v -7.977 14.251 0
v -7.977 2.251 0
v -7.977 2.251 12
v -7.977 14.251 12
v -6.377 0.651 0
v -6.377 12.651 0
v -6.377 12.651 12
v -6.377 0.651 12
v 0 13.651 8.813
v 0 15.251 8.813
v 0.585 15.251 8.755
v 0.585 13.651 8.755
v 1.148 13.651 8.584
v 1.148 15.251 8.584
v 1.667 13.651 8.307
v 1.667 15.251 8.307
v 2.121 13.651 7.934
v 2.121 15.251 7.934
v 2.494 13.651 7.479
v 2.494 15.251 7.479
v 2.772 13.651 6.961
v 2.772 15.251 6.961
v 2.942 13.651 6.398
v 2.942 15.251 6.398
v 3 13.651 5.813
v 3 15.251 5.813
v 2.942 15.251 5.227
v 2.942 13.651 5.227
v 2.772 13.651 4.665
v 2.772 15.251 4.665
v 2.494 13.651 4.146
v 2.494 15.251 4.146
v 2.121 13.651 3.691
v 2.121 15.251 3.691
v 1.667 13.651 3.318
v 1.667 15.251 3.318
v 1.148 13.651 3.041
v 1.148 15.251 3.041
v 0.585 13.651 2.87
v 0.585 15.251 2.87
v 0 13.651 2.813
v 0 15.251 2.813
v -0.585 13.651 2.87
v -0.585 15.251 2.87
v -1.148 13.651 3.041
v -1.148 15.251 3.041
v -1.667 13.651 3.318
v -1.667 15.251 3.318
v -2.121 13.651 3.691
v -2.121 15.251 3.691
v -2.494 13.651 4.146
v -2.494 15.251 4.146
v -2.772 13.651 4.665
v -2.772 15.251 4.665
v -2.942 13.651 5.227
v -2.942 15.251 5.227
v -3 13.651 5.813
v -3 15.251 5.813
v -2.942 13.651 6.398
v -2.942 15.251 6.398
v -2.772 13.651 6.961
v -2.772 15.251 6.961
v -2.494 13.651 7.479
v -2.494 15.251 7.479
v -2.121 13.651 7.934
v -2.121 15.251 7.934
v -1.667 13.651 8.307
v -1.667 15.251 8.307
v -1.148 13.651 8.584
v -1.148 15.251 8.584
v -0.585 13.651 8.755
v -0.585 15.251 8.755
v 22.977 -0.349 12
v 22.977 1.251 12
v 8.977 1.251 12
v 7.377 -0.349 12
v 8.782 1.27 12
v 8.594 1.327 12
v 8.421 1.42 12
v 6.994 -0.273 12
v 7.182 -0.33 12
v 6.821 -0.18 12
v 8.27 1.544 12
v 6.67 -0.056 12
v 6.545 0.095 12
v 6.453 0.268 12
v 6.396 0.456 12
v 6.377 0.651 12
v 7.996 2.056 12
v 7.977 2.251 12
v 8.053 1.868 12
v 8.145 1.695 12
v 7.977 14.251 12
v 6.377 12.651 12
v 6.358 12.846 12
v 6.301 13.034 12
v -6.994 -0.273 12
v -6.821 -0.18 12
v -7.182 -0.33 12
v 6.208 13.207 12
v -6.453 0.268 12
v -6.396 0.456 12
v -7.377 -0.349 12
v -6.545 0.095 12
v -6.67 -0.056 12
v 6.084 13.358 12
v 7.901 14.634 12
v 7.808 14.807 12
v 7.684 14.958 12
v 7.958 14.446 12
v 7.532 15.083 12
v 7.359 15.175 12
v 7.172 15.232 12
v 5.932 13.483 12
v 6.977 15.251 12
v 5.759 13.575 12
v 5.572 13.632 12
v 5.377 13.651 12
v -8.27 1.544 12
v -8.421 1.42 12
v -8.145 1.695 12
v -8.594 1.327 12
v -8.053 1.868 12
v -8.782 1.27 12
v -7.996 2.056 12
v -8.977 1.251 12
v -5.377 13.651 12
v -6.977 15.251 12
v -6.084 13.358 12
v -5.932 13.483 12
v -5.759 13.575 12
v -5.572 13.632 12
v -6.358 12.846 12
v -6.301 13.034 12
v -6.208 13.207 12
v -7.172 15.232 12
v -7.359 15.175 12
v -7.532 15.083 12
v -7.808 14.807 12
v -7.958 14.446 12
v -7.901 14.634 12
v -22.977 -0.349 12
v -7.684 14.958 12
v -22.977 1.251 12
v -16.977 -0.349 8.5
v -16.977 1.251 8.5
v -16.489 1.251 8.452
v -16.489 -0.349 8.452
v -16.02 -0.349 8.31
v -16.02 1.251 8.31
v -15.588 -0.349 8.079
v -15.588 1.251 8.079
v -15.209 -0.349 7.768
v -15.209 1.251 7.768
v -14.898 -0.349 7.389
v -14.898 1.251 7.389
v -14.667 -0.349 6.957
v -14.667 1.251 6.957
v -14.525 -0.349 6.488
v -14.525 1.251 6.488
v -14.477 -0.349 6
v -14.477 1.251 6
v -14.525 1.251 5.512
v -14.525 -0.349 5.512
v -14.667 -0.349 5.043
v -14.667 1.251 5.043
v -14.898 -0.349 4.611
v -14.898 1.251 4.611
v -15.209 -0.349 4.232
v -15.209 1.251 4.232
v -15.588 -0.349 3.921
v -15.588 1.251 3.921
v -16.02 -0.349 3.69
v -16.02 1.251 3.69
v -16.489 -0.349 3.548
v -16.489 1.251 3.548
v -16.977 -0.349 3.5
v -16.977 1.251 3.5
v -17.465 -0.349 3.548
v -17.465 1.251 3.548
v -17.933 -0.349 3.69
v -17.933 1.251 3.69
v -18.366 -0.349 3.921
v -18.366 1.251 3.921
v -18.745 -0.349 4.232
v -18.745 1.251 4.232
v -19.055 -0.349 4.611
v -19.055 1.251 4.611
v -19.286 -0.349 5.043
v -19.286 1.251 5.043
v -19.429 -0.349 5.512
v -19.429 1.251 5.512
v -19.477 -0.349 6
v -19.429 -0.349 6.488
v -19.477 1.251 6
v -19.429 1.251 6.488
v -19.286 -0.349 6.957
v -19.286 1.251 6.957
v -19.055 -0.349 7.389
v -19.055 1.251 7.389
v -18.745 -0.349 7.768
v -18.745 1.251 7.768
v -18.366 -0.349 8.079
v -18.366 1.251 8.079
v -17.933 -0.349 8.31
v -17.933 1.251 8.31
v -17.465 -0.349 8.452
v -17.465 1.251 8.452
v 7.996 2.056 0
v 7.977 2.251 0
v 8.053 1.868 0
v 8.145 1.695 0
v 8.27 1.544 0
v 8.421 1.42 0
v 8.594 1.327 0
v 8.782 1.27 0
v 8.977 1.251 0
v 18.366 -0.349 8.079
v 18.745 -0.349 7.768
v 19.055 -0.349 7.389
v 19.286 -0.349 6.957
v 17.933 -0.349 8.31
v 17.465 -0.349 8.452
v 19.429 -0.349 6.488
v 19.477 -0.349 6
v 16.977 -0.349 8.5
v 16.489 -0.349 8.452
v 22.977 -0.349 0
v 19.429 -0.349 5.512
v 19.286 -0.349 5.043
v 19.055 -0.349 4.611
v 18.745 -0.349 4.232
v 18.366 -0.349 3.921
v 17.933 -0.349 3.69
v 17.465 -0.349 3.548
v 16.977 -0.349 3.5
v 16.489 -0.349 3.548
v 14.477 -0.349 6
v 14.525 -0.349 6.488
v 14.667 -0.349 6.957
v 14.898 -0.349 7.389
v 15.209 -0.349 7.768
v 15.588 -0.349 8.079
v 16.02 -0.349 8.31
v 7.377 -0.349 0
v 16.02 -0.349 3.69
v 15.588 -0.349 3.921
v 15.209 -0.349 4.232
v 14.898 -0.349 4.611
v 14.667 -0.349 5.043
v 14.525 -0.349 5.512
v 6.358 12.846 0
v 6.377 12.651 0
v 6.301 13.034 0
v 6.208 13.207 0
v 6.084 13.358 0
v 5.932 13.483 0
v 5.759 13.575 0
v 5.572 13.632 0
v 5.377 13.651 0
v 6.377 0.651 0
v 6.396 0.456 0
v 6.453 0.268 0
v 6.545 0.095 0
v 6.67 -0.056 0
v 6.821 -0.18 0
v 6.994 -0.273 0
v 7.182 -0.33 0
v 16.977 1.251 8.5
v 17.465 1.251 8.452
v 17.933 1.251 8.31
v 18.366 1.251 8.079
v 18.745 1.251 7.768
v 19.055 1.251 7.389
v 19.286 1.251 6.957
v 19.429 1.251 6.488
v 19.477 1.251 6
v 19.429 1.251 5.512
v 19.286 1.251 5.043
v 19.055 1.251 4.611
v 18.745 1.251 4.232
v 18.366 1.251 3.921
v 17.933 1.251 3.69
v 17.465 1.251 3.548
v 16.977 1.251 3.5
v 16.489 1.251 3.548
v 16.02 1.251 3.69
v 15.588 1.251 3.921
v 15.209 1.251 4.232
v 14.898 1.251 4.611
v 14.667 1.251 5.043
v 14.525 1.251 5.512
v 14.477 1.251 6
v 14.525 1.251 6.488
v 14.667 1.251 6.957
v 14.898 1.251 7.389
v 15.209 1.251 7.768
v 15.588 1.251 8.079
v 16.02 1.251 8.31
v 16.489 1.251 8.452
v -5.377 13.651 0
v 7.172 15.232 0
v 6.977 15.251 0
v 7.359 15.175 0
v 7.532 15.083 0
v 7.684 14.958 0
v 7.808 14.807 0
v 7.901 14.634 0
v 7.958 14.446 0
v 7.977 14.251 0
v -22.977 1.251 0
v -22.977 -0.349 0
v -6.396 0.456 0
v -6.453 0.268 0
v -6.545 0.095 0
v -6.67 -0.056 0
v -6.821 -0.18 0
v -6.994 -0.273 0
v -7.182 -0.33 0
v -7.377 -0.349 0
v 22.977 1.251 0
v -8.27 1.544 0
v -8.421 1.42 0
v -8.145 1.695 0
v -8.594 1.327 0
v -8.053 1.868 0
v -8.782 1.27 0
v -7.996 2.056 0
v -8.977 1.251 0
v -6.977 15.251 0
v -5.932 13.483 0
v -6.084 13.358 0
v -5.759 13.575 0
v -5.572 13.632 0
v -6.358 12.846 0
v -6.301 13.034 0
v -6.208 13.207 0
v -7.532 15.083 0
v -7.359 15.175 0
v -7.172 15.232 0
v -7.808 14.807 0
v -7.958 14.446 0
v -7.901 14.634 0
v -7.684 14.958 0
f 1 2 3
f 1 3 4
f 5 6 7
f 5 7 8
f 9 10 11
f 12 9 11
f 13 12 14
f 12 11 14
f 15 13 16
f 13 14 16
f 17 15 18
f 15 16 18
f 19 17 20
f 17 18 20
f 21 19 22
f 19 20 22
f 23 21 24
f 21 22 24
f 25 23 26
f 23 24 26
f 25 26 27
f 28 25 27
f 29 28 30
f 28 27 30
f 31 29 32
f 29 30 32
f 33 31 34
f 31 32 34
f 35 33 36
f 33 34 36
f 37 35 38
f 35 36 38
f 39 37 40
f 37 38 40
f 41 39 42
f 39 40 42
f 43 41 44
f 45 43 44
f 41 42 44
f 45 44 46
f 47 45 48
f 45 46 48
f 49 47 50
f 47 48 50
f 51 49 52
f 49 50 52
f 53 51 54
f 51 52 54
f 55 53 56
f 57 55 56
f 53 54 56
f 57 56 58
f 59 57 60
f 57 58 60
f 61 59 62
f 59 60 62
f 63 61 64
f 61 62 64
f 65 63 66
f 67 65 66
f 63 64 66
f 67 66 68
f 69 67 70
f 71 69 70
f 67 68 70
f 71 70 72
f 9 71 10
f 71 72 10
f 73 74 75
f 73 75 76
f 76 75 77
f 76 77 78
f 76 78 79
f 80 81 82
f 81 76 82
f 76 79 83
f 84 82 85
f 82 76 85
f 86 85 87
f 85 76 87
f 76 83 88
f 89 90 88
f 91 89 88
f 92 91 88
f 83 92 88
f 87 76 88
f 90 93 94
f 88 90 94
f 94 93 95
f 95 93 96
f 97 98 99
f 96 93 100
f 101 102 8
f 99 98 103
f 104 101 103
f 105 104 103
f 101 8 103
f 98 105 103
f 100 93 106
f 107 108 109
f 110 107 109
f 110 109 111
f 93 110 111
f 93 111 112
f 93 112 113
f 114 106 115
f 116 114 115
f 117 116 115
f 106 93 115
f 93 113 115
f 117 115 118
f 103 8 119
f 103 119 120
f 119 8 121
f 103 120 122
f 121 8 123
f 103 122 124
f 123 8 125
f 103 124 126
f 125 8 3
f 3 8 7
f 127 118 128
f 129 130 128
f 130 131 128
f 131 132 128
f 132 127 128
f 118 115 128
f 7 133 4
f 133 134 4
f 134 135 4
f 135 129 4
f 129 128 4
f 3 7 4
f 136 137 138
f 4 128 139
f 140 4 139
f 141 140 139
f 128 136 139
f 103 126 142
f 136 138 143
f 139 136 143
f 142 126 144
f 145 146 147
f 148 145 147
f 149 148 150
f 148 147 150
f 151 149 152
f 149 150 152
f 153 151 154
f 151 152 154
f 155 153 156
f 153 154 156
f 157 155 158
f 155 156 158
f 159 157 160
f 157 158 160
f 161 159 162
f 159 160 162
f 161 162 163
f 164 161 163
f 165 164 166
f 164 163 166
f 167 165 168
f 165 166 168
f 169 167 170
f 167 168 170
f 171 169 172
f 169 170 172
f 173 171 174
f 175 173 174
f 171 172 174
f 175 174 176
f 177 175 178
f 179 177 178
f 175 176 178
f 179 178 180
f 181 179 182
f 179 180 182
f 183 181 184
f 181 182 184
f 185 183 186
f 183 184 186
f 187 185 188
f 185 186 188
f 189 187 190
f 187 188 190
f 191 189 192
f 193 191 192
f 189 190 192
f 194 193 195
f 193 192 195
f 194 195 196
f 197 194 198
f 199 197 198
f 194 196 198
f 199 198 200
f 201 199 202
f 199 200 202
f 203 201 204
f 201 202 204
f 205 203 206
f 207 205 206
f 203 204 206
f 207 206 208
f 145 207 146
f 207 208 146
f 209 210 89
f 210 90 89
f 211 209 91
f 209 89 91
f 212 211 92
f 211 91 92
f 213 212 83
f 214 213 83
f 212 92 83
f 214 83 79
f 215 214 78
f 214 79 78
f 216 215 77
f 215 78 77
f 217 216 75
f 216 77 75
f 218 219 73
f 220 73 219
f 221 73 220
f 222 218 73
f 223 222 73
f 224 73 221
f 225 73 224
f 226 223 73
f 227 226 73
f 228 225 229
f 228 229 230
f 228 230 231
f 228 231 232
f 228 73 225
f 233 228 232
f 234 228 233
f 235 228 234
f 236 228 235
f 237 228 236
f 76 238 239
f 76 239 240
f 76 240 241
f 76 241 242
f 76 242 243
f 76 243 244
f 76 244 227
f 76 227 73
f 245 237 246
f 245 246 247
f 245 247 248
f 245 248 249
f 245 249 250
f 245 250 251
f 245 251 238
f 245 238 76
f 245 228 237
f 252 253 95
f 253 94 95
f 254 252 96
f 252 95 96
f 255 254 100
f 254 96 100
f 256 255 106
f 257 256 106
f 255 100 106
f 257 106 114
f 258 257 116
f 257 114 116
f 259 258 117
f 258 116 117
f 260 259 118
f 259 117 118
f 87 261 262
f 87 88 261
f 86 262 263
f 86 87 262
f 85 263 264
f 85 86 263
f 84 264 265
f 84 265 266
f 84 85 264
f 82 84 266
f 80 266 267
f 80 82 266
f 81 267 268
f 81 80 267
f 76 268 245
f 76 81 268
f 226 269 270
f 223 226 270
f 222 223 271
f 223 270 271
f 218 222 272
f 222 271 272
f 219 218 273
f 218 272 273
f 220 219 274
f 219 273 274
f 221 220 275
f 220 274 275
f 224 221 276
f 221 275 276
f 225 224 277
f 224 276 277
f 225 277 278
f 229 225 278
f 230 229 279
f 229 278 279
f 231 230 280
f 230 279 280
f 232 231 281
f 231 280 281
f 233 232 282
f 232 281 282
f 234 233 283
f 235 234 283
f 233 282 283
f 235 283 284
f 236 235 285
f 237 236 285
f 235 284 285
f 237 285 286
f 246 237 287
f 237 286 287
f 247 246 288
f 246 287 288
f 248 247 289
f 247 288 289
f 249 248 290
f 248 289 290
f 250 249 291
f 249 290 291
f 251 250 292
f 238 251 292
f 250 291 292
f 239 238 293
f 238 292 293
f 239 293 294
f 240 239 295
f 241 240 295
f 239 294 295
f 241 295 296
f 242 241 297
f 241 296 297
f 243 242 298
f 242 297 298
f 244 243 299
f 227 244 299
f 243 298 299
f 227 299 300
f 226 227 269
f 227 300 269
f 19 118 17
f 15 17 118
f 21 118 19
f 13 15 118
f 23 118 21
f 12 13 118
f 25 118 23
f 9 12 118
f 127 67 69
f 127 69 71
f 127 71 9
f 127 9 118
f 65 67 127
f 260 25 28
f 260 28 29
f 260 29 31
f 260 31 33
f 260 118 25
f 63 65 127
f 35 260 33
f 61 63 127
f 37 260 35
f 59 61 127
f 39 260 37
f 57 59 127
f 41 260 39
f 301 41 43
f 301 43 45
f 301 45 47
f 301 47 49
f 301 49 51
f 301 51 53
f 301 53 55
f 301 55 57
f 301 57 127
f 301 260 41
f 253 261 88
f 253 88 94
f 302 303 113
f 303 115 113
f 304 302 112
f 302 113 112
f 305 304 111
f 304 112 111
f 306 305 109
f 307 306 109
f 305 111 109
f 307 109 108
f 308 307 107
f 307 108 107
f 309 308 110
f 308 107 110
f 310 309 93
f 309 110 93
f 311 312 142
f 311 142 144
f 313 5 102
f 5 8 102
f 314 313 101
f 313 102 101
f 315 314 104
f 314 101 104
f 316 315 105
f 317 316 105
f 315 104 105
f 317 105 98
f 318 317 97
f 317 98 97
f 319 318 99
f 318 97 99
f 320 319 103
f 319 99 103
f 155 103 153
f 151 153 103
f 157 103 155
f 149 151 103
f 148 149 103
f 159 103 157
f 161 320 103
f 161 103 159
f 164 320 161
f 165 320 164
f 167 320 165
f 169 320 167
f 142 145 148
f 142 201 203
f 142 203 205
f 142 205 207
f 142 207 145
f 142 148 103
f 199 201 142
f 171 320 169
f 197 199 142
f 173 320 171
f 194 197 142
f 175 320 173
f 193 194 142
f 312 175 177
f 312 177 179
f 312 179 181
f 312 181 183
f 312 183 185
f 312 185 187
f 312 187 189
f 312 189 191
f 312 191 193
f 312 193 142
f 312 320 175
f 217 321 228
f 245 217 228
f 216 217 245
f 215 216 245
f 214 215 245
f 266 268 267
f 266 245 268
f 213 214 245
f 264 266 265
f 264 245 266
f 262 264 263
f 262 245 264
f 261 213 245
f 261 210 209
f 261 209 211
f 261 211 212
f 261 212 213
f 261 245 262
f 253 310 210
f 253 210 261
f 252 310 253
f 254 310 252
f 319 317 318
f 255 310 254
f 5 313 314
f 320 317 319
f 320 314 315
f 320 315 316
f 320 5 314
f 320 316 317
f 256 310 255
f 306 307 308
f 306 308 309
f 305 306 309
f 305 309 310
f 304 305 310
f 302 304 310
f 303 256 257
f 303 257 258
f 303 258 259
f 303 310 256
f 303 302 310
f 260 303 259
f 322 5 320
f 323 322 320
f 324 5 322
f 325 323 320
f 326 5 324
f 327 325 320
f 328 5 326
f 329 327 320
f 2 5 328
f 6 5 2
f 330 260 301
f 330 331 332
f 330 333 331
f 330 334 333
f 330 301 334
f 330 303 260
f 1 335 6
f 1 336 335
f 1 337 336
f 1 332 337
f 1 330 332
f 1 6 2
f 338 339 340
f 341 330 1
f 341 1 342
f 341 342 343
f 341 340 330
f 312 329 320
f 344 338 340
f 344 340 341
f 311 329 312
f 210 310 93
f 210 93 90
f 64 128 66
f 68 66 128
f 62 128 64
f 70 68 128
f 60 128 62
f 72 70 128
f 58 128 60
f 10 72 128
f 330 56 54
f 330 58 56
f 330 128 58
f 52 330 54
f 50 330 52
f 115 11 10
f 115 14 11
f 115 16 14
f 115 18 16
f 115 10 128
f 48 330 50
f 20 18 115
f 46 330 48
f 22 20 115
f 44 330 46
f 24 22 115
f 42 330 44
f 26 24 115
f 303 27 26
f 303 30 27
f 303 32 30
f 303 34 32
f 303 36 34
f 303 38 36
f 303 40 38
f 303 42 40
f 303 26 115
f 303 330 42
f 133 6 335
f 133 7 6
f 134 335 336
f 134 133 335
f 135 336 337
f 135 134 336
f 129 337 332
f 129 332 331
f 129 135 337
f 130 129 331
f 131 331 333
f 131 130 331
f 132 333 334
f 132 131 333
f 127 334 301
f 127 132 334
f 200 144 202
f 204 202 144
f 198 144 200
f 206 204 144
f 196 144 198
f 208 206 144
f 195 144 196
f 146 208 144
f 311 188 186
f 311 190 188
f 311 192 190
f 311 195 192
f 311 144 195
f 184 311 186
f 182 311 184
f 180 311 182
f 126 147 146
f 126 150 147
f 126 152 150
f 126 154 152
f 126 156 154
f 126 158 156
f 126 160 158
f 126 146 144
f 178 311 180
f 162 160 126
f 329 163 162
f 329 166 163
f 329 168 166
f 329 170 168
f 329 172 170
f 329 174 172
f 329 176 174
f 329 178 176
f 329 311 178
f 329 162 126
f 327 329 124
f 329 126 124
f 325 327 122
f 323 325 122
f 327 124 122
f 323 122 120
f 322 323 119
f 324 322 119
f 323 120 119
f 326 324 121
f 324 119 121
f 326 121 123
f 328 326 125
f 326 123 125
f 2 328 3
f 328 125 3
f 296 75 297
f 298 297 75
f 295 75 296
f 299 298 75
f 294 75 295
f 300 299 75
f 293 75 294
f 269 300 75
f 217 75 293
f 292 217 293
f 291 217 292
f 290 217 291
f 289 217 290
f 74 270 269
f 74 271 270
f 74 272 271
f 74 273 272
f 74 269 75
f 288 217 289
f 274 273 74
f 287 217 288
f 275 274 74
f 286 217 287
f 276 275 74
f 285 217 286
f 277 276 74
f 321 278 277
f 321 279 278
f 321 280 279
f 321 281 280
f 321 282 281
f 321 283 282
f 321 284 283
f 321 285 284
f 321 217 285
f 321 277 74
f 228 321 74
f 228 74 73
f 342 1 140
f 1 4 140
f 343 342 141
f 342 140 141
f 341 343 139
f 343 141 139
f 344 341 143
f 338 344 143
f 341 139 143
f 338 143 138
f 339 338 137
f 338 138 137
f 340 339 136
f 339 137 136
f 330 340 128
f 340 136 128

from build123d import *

# Parameters (mm, degrees)
BOSS_EXTRUDE1_DEPTH = 12
SKETCH2_R           = 2.5
CUT_EXTRUDE2_DEPTH  = 1.6
SKETCH3_R           = 3
CUT_EXTRUDE3_DEPTH  = 1.6
FILLET2_R           = 1
FILLET3_R           = 1
FILLET4_R           = 1
FILLET5_R           = 1
FILLET6_R           = 1
FILLET7_R           = 1
FILLET8_R           = 1
FILLET9_R           = 1


with BuildPart() as part:
    # Sketch1 → Boss-Extrude1 (new body)
    with BuildSketch(Plane.XY):
        Polygon((-22.976789636, 1.251050745), (-7.976789636, 1.251050745), (-7.976789636, 15.251050745), (7.976789636, 15.251050745), (7.976789636, 1.251050745), (22.976789636, 1.251050745), (22.976789636, -0.348949255), (6.376789636, -0.348949255), (6.376789636, 13.651050745), (-6.376789636, 13.651050745), (-6.376789636, -0.348949255), (-22.976789636, -0.348949255), align=None)
    extrude(amount=BOSS_EXTRUDE1_DEPTH)

    # Sketch2 → Cut-Extrude2 (cut)
    with BuildSketch(Plane(origin=(0, 1.251050745, 0), x_dir=(1, 0, 0), z_dir=(0, 1, 0))):
        with Locations(Location((-16.976789636, -6, 0), (0, 0, 270))):  # turned: the seam where the file's is
            Circle(SKETCH2_R)
        with Locations(Location((16.976789636, -6, 0), (0, 0, 270))):  # turned: the seam where the file's is
            Circle(SKETCH2_R)
    extrude(amount=-CUT_EXTRUDE2_DEPTH, mode=Mode.SUBTRACT)

    # Sketch3 → Cut-Extrude3 (cut)
    with BuildSketch(Plane(origin=(0, 15.251050745, 0), x_dir=(1, 0, 0), z_dir=(0, 1, 0))):
        with Locations(Location((0, -5.812620311, 0), (0, 0, 270))):  # turned: the seam where the file's is
            Circle(SKETCH3_R)
    extrude(amount=-CUT_EXTRUDE3_DEPTH, mode=Mode.SUBTRACT)

    # Fillet2
    fillet2_edges = [part.edges().sort_by_distance(p)[0] for p in [
        (-7.976789636, 15.251050745, 6),
    ]]
    fillet(fillet2_edges, radius=FILLET2_R)

    # Fillet3
    fillet3_edges = [part.edges().sort_by_distance(p)[0] for p in [
        (7.976789636, 15.251050745, 6),
    ]]
    fillet(fillet3_edges, radius=FILLET3_R)

    # Fillet4
    fillet4_edges = [part.edges().sort_by_distance(p)[0] for p in [
        (-6.376789636, 13.651050745, 6),
    ]]
    fillet(fillet4_edges, radius=FILLET4_R)

    # Fillet5
    fillet5_edges = [part.edges().sort_by_distance(p)[0] for p in [
        (-6.376789636, -0.348949255, 6),
    ]]
    fillet(fillet5_edges, radius=FILLET5_R)

    # Fillet6
    fillet6_edges = [part.edges().sort_by_distance(p)[0] for p in [
        (6.376789636, -0.348949255, 6),
    ]]
    fillet(fillet6_edges, radius=FILLET6_R)

    # Fillet7
    fillet7_edges = [part.edges().sort_by_distance(p)[0] for p in [
        (6.376789636, 13.651050745, 6),
    ]]
    fillet(fillet7_edges, radius=FILLET7_R)

    # Fillet8
    fillet8_edges = [part.edges().sort_by_distance(p)[0] for p in [
        (-7.976789636, 1.251050745, 6),
    ]]
    fillet(fillet8_edges, radius=FILLET8_R)

    # Fillet9
    fillet9_edges = [part.edges().sort_by_distance(p)[0] for p in [
        (7.976789636, 1.251050745, 6),
    ]]
    fillet(fillet9_edges, radius=FILLET9_R)


solid = part.part
